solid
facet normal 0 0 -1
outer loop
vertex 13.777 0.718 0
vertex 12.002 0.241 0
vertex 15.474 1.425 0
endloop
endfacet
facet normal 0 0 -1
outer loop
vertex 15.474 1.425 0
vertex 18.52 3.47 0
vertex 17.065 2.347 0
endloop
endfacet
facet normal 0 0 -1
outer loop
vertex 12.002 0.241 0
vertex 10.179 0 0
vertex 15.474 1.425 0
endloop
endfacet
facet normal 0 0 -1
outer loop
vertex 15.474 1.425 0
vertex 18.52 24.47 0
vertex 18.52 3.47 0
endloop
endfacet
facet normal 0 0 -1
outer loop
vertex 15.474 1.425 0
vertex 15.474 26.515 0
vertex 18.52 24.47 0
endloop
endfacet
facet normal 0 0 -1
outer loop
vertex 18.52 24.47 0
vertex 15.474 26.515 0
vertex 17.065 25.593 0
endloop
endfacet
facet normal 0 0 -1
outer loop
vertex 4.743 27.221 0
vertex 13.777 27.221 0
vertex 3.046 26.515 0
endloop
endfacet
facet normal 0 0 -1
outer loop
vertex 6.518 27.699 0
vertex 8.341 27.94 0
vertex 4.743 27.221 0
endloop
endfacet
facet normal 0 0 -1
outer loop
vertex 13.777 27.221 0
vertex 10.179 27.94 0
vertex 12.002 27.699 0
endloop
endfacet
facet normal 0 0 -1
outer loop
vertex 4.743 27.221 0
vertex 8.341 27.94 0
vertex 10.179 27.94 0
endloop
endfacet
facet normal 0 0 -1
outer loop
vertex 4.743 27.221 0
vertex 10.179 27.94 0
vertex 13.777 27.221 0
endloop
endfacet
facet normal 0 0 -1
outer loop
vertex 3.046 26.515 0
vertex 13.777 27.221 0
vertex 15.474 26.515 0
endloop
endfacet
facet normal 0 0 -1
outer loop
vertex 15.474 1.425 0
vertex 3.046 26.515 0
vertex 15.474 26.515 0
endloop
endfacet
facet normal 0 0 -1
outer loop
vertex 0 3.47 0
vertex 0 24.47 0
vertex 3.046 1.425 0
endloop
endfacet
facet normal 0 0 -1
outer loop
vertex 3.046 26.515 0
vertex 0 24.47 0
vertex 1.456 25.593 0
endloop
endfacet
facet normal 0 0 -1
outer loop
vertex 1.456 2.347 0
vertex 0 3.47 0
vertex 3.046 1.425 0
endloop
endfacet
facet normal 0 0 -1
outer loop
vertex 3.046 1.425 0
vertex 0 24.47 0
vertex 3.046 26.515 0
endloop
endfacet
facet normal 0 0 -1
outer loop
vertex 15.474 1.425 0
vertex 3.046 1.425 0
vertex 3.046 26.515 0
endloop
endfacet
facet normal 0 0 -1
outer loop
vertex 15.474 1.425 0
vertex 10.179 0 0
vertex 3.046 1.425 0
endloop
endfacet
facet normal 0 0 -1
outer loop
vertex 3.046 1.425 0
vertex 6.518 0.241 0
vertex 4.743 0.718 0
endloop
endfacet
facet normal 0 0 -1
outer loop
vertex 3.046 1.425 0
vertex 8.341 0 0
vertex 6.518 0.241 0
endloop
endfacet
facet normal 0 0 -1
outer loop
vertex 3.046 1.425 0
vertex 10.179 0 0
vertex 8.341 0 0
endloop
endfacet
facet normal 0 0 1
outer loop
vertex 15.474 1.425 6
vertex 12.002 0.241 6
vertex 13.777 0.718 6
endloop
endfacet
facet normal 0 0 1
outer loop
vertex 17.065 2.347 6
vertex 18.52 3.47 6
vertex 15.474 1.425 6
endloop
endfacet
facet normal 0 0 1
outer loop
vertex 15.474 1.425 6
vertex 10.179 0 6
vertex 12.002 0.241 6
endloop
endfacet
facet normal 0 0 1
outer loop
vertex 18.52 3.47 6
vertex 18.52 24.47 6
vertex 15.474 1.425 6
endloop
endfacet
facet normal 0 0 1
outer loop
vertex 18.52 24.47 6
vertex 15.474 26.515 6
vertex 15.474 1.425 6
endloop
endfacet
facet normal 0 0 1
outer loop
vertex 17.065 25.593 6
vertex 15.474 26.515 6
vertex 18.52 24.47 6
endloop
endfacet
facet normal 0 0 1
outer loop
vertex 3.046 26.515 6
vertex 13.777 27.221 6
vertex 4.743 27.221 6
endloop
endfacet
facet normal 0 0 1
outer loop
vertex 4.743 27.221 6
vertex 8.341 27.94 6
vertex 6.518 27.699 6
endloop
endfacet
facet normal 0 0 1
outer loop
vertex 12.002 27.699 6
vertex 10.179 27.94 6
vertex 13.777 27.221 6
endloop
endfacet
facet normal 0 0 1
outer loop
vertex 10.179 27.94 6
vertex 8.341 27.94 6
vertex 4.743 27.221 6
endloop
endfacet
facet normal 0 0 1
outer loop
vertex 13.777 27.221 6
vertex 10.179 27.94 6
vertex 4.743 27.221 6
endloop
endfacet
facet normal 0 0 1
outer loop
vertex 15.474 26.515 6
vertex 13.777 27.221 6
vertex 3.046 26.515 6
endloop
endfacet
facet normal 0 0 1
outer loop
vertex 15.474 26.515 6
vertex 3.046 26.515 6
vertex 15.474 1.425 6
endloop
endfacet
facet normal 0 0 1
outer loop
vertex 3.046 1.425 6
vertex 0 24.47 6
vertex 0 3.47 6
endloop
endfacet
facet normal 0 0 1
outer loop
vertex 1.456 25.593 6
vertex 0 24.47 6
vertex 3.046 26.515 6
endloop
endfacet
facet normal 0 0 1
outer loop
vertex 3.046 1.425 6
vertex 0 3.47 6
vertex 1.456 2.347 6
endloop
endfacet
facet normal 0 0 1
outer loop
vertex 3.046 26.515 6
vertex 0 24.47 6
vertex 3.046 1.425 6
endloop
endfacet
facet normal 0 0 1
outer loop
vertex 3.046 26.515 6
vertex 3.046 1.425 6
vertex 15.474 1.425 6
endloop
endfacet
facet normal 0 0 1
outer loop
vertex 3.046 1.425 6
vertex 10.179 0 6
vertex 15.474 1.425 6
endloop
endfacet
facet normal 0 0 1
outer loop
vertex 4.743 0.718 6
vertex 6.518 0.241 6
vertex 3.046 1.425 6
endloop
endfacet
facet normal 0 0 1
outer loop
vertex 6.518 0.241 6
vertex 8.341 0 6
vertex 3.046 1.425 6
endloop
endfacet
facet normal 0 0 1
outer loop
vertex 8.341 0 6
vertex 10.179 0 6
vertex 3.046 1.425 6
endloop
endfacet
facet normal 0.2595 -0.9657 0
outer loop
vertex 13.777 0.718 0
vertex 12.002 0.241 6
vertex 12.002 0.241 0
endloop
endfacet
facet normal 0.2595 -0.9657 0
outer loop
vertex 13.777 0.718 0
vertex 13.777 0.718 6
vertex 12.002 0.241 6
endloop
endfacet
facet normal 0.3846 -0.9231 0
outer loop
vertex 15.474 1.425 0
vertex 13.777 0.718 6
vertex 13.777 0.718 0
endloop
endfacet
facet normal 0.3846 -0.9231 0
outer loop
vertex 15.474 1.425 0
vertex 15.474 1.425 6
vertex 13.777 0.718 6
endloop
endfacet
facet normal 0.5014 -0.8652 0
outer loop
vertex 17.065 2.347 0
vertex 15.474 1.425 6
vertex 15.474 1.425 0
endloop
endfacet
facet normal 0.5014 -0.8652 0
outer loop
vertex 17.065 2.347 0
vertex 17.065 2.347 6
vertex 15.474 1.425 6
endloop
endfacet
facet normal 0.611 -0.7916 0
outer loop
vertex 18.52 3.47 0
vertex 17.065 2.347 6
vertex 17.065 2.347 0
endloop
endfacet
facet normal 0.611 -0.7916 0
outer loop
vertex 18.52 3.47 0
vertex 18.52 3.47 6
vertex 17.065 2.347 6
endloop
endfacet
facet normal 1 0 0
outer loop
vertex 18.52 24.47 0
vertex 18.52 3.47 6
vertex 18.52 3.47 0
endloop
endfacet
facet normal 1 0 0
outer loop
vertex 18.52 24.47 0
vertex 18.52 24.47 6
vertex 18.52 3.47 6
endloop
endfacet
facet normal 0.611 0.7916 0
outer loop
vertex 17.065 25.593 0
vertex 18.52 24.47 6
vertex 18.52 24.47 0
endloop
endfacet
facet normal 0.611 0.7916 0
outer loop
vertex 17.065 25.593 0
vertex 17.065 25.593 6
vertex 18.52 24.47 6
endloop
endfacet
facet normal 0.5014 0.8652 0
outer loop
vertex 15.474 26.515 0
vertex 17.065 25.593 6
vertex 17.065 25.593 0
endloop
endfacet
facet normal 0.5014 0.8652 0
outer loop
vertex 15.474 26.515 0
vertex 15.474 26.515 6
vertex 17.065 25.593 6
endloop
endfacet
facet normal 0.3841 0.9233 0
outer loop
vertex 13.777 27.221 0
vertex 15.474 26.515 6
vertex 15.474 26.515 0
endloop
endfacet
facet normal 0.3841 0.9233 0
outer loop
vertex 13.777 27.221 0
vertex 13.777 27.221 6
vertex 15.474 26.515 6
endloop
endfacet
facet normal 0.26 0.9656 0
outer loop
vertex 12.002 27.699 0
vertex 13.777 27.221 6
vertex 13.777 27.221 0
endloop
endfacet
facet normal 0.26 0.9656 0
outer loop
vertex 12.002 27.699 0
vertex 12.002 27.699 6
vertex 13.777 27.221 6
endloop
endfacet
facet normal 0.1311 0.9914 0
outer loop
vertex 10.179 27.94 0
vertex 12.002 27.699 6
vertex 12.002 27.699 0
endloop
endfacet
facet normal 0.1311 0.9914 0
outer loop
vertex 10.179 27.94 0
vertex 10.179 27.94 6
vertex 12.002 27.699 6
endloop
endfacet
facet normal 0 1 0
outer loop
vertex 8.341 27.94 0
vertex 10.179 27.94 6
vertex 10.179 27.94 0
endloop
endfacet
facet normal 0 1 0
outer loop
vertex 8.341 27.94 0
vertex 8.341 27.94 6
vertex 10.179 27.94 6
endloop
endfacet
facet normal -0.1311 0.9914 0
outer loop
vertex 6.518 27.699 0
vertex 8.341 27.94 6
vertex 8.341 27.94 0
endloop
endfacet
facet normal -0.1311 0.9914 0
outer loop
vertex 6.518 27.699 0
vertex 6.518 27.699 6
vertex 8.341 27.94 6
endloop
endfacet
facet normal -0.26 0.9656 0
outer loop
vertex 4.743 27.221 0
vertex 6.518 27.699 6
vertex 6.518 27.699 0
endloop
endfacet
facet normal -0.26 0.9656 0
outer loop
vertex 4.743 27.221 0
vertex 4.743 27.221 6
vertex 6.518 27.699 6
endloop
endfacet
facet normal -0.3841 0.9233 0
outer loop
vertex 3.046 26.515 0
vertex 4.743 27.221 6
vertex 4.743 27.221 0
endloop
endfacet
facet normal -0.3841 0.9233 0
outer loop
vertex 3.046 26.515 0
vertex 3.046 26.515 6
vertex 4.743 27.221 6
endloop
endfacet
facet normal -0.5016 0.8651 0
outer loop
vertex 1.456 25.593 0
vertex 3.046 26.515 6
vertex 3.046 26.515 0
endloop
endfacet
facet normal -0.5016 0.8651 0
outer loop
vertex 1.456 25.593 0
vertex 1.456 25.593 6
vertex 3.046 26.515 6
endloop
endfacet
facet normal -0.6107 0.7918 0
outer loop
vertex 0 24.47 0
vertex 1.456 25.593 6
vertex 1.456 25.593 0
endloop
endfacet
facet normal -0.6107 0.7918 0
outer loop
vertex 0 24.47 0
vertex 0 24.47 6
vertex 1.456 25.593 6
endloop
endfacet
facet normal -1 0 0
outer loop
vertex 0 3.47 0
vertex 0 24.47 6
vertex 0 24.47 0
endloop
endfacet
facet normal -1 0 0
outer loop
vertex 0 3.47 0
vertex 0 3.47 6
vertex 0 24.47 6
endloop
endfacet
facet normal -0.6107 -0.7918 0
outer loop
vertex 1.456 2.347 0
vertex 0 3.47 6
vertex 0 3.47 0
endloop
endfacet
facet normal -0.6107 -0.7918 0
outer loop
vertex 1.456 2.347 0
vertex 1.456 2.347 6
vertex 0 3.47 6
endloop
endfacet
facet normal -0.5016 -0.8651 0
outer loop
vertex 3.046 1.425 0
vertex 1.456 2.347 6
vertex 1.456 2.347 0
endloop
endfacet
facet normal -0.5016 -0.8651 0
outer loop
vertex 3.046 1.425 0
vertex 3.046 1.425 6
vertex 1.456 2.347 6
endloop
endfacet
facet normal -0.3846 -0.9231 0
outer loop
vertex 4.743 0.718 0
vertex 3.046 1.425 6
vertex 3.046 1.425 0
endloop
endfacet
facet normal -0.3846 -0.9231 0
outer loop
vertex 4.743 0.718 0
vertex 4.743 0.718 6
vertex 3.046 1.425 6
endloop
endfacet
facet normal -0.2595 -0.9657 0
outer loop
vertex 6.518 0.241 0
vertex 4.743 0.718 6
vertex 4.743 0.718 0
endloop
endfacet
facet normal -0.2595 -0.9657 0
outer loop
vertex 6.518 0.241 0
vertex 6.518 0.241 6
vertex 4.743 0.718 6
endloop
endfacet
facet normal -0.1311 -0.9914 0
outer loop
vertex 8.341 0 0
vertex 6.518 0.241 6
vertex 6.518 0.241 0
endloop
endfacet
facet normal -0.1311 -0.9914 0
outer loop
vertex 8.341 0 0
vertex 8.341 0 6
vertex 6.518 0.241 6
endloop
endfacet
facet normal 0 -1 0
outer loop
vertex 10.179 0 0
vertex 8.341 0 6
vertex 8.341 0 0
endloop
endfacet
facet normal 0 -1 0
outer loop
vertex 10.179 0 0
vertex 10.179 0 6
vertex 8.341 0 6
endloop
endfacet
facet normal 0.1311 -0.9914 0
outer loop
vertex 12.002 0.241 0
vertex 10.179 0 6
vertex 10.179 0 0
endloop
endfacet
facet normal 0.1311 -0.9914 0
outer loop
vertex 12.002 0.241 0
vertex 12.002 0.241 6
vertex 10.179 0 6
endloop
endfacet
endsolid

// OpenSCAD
$fn = 32;

// ----------------------------------------------------------------------
// Eccentric disc: double_d, 6 mm thick
// ----------------------------------------------------------------------

// --- parameters (mm) ---
profile_height = 6;       // extrusion height
profile_points = 24;      // points of the closed outline

profile = [[18.52, 24.47], [17.065, 25.593], [15.474, 26.515], [13.777, 27.221], [12.002, 27.699], [10.179, 27.94], [8.341, 27.94], [6.518, 27.699], [4.743, 27.221], [3.046, 26.515], [1.456, 25.593], [0, 24.47], [0, 3.47], [1.456, 2.347], [3.046, 1.425], [4.743, 0.718], [6.518, 0.241], [8.341, 0], [10.179, 0], [12.002, 0.241], [13.777, 0.718], [15.474, 1.425], [17.065, 2.347], [18.52, 3.47]];  // single closed polygon, 24 points, counter clockwise

// --- the one profile operation ---
linear_extrude(height = profile_height) polygon(points = profile);
